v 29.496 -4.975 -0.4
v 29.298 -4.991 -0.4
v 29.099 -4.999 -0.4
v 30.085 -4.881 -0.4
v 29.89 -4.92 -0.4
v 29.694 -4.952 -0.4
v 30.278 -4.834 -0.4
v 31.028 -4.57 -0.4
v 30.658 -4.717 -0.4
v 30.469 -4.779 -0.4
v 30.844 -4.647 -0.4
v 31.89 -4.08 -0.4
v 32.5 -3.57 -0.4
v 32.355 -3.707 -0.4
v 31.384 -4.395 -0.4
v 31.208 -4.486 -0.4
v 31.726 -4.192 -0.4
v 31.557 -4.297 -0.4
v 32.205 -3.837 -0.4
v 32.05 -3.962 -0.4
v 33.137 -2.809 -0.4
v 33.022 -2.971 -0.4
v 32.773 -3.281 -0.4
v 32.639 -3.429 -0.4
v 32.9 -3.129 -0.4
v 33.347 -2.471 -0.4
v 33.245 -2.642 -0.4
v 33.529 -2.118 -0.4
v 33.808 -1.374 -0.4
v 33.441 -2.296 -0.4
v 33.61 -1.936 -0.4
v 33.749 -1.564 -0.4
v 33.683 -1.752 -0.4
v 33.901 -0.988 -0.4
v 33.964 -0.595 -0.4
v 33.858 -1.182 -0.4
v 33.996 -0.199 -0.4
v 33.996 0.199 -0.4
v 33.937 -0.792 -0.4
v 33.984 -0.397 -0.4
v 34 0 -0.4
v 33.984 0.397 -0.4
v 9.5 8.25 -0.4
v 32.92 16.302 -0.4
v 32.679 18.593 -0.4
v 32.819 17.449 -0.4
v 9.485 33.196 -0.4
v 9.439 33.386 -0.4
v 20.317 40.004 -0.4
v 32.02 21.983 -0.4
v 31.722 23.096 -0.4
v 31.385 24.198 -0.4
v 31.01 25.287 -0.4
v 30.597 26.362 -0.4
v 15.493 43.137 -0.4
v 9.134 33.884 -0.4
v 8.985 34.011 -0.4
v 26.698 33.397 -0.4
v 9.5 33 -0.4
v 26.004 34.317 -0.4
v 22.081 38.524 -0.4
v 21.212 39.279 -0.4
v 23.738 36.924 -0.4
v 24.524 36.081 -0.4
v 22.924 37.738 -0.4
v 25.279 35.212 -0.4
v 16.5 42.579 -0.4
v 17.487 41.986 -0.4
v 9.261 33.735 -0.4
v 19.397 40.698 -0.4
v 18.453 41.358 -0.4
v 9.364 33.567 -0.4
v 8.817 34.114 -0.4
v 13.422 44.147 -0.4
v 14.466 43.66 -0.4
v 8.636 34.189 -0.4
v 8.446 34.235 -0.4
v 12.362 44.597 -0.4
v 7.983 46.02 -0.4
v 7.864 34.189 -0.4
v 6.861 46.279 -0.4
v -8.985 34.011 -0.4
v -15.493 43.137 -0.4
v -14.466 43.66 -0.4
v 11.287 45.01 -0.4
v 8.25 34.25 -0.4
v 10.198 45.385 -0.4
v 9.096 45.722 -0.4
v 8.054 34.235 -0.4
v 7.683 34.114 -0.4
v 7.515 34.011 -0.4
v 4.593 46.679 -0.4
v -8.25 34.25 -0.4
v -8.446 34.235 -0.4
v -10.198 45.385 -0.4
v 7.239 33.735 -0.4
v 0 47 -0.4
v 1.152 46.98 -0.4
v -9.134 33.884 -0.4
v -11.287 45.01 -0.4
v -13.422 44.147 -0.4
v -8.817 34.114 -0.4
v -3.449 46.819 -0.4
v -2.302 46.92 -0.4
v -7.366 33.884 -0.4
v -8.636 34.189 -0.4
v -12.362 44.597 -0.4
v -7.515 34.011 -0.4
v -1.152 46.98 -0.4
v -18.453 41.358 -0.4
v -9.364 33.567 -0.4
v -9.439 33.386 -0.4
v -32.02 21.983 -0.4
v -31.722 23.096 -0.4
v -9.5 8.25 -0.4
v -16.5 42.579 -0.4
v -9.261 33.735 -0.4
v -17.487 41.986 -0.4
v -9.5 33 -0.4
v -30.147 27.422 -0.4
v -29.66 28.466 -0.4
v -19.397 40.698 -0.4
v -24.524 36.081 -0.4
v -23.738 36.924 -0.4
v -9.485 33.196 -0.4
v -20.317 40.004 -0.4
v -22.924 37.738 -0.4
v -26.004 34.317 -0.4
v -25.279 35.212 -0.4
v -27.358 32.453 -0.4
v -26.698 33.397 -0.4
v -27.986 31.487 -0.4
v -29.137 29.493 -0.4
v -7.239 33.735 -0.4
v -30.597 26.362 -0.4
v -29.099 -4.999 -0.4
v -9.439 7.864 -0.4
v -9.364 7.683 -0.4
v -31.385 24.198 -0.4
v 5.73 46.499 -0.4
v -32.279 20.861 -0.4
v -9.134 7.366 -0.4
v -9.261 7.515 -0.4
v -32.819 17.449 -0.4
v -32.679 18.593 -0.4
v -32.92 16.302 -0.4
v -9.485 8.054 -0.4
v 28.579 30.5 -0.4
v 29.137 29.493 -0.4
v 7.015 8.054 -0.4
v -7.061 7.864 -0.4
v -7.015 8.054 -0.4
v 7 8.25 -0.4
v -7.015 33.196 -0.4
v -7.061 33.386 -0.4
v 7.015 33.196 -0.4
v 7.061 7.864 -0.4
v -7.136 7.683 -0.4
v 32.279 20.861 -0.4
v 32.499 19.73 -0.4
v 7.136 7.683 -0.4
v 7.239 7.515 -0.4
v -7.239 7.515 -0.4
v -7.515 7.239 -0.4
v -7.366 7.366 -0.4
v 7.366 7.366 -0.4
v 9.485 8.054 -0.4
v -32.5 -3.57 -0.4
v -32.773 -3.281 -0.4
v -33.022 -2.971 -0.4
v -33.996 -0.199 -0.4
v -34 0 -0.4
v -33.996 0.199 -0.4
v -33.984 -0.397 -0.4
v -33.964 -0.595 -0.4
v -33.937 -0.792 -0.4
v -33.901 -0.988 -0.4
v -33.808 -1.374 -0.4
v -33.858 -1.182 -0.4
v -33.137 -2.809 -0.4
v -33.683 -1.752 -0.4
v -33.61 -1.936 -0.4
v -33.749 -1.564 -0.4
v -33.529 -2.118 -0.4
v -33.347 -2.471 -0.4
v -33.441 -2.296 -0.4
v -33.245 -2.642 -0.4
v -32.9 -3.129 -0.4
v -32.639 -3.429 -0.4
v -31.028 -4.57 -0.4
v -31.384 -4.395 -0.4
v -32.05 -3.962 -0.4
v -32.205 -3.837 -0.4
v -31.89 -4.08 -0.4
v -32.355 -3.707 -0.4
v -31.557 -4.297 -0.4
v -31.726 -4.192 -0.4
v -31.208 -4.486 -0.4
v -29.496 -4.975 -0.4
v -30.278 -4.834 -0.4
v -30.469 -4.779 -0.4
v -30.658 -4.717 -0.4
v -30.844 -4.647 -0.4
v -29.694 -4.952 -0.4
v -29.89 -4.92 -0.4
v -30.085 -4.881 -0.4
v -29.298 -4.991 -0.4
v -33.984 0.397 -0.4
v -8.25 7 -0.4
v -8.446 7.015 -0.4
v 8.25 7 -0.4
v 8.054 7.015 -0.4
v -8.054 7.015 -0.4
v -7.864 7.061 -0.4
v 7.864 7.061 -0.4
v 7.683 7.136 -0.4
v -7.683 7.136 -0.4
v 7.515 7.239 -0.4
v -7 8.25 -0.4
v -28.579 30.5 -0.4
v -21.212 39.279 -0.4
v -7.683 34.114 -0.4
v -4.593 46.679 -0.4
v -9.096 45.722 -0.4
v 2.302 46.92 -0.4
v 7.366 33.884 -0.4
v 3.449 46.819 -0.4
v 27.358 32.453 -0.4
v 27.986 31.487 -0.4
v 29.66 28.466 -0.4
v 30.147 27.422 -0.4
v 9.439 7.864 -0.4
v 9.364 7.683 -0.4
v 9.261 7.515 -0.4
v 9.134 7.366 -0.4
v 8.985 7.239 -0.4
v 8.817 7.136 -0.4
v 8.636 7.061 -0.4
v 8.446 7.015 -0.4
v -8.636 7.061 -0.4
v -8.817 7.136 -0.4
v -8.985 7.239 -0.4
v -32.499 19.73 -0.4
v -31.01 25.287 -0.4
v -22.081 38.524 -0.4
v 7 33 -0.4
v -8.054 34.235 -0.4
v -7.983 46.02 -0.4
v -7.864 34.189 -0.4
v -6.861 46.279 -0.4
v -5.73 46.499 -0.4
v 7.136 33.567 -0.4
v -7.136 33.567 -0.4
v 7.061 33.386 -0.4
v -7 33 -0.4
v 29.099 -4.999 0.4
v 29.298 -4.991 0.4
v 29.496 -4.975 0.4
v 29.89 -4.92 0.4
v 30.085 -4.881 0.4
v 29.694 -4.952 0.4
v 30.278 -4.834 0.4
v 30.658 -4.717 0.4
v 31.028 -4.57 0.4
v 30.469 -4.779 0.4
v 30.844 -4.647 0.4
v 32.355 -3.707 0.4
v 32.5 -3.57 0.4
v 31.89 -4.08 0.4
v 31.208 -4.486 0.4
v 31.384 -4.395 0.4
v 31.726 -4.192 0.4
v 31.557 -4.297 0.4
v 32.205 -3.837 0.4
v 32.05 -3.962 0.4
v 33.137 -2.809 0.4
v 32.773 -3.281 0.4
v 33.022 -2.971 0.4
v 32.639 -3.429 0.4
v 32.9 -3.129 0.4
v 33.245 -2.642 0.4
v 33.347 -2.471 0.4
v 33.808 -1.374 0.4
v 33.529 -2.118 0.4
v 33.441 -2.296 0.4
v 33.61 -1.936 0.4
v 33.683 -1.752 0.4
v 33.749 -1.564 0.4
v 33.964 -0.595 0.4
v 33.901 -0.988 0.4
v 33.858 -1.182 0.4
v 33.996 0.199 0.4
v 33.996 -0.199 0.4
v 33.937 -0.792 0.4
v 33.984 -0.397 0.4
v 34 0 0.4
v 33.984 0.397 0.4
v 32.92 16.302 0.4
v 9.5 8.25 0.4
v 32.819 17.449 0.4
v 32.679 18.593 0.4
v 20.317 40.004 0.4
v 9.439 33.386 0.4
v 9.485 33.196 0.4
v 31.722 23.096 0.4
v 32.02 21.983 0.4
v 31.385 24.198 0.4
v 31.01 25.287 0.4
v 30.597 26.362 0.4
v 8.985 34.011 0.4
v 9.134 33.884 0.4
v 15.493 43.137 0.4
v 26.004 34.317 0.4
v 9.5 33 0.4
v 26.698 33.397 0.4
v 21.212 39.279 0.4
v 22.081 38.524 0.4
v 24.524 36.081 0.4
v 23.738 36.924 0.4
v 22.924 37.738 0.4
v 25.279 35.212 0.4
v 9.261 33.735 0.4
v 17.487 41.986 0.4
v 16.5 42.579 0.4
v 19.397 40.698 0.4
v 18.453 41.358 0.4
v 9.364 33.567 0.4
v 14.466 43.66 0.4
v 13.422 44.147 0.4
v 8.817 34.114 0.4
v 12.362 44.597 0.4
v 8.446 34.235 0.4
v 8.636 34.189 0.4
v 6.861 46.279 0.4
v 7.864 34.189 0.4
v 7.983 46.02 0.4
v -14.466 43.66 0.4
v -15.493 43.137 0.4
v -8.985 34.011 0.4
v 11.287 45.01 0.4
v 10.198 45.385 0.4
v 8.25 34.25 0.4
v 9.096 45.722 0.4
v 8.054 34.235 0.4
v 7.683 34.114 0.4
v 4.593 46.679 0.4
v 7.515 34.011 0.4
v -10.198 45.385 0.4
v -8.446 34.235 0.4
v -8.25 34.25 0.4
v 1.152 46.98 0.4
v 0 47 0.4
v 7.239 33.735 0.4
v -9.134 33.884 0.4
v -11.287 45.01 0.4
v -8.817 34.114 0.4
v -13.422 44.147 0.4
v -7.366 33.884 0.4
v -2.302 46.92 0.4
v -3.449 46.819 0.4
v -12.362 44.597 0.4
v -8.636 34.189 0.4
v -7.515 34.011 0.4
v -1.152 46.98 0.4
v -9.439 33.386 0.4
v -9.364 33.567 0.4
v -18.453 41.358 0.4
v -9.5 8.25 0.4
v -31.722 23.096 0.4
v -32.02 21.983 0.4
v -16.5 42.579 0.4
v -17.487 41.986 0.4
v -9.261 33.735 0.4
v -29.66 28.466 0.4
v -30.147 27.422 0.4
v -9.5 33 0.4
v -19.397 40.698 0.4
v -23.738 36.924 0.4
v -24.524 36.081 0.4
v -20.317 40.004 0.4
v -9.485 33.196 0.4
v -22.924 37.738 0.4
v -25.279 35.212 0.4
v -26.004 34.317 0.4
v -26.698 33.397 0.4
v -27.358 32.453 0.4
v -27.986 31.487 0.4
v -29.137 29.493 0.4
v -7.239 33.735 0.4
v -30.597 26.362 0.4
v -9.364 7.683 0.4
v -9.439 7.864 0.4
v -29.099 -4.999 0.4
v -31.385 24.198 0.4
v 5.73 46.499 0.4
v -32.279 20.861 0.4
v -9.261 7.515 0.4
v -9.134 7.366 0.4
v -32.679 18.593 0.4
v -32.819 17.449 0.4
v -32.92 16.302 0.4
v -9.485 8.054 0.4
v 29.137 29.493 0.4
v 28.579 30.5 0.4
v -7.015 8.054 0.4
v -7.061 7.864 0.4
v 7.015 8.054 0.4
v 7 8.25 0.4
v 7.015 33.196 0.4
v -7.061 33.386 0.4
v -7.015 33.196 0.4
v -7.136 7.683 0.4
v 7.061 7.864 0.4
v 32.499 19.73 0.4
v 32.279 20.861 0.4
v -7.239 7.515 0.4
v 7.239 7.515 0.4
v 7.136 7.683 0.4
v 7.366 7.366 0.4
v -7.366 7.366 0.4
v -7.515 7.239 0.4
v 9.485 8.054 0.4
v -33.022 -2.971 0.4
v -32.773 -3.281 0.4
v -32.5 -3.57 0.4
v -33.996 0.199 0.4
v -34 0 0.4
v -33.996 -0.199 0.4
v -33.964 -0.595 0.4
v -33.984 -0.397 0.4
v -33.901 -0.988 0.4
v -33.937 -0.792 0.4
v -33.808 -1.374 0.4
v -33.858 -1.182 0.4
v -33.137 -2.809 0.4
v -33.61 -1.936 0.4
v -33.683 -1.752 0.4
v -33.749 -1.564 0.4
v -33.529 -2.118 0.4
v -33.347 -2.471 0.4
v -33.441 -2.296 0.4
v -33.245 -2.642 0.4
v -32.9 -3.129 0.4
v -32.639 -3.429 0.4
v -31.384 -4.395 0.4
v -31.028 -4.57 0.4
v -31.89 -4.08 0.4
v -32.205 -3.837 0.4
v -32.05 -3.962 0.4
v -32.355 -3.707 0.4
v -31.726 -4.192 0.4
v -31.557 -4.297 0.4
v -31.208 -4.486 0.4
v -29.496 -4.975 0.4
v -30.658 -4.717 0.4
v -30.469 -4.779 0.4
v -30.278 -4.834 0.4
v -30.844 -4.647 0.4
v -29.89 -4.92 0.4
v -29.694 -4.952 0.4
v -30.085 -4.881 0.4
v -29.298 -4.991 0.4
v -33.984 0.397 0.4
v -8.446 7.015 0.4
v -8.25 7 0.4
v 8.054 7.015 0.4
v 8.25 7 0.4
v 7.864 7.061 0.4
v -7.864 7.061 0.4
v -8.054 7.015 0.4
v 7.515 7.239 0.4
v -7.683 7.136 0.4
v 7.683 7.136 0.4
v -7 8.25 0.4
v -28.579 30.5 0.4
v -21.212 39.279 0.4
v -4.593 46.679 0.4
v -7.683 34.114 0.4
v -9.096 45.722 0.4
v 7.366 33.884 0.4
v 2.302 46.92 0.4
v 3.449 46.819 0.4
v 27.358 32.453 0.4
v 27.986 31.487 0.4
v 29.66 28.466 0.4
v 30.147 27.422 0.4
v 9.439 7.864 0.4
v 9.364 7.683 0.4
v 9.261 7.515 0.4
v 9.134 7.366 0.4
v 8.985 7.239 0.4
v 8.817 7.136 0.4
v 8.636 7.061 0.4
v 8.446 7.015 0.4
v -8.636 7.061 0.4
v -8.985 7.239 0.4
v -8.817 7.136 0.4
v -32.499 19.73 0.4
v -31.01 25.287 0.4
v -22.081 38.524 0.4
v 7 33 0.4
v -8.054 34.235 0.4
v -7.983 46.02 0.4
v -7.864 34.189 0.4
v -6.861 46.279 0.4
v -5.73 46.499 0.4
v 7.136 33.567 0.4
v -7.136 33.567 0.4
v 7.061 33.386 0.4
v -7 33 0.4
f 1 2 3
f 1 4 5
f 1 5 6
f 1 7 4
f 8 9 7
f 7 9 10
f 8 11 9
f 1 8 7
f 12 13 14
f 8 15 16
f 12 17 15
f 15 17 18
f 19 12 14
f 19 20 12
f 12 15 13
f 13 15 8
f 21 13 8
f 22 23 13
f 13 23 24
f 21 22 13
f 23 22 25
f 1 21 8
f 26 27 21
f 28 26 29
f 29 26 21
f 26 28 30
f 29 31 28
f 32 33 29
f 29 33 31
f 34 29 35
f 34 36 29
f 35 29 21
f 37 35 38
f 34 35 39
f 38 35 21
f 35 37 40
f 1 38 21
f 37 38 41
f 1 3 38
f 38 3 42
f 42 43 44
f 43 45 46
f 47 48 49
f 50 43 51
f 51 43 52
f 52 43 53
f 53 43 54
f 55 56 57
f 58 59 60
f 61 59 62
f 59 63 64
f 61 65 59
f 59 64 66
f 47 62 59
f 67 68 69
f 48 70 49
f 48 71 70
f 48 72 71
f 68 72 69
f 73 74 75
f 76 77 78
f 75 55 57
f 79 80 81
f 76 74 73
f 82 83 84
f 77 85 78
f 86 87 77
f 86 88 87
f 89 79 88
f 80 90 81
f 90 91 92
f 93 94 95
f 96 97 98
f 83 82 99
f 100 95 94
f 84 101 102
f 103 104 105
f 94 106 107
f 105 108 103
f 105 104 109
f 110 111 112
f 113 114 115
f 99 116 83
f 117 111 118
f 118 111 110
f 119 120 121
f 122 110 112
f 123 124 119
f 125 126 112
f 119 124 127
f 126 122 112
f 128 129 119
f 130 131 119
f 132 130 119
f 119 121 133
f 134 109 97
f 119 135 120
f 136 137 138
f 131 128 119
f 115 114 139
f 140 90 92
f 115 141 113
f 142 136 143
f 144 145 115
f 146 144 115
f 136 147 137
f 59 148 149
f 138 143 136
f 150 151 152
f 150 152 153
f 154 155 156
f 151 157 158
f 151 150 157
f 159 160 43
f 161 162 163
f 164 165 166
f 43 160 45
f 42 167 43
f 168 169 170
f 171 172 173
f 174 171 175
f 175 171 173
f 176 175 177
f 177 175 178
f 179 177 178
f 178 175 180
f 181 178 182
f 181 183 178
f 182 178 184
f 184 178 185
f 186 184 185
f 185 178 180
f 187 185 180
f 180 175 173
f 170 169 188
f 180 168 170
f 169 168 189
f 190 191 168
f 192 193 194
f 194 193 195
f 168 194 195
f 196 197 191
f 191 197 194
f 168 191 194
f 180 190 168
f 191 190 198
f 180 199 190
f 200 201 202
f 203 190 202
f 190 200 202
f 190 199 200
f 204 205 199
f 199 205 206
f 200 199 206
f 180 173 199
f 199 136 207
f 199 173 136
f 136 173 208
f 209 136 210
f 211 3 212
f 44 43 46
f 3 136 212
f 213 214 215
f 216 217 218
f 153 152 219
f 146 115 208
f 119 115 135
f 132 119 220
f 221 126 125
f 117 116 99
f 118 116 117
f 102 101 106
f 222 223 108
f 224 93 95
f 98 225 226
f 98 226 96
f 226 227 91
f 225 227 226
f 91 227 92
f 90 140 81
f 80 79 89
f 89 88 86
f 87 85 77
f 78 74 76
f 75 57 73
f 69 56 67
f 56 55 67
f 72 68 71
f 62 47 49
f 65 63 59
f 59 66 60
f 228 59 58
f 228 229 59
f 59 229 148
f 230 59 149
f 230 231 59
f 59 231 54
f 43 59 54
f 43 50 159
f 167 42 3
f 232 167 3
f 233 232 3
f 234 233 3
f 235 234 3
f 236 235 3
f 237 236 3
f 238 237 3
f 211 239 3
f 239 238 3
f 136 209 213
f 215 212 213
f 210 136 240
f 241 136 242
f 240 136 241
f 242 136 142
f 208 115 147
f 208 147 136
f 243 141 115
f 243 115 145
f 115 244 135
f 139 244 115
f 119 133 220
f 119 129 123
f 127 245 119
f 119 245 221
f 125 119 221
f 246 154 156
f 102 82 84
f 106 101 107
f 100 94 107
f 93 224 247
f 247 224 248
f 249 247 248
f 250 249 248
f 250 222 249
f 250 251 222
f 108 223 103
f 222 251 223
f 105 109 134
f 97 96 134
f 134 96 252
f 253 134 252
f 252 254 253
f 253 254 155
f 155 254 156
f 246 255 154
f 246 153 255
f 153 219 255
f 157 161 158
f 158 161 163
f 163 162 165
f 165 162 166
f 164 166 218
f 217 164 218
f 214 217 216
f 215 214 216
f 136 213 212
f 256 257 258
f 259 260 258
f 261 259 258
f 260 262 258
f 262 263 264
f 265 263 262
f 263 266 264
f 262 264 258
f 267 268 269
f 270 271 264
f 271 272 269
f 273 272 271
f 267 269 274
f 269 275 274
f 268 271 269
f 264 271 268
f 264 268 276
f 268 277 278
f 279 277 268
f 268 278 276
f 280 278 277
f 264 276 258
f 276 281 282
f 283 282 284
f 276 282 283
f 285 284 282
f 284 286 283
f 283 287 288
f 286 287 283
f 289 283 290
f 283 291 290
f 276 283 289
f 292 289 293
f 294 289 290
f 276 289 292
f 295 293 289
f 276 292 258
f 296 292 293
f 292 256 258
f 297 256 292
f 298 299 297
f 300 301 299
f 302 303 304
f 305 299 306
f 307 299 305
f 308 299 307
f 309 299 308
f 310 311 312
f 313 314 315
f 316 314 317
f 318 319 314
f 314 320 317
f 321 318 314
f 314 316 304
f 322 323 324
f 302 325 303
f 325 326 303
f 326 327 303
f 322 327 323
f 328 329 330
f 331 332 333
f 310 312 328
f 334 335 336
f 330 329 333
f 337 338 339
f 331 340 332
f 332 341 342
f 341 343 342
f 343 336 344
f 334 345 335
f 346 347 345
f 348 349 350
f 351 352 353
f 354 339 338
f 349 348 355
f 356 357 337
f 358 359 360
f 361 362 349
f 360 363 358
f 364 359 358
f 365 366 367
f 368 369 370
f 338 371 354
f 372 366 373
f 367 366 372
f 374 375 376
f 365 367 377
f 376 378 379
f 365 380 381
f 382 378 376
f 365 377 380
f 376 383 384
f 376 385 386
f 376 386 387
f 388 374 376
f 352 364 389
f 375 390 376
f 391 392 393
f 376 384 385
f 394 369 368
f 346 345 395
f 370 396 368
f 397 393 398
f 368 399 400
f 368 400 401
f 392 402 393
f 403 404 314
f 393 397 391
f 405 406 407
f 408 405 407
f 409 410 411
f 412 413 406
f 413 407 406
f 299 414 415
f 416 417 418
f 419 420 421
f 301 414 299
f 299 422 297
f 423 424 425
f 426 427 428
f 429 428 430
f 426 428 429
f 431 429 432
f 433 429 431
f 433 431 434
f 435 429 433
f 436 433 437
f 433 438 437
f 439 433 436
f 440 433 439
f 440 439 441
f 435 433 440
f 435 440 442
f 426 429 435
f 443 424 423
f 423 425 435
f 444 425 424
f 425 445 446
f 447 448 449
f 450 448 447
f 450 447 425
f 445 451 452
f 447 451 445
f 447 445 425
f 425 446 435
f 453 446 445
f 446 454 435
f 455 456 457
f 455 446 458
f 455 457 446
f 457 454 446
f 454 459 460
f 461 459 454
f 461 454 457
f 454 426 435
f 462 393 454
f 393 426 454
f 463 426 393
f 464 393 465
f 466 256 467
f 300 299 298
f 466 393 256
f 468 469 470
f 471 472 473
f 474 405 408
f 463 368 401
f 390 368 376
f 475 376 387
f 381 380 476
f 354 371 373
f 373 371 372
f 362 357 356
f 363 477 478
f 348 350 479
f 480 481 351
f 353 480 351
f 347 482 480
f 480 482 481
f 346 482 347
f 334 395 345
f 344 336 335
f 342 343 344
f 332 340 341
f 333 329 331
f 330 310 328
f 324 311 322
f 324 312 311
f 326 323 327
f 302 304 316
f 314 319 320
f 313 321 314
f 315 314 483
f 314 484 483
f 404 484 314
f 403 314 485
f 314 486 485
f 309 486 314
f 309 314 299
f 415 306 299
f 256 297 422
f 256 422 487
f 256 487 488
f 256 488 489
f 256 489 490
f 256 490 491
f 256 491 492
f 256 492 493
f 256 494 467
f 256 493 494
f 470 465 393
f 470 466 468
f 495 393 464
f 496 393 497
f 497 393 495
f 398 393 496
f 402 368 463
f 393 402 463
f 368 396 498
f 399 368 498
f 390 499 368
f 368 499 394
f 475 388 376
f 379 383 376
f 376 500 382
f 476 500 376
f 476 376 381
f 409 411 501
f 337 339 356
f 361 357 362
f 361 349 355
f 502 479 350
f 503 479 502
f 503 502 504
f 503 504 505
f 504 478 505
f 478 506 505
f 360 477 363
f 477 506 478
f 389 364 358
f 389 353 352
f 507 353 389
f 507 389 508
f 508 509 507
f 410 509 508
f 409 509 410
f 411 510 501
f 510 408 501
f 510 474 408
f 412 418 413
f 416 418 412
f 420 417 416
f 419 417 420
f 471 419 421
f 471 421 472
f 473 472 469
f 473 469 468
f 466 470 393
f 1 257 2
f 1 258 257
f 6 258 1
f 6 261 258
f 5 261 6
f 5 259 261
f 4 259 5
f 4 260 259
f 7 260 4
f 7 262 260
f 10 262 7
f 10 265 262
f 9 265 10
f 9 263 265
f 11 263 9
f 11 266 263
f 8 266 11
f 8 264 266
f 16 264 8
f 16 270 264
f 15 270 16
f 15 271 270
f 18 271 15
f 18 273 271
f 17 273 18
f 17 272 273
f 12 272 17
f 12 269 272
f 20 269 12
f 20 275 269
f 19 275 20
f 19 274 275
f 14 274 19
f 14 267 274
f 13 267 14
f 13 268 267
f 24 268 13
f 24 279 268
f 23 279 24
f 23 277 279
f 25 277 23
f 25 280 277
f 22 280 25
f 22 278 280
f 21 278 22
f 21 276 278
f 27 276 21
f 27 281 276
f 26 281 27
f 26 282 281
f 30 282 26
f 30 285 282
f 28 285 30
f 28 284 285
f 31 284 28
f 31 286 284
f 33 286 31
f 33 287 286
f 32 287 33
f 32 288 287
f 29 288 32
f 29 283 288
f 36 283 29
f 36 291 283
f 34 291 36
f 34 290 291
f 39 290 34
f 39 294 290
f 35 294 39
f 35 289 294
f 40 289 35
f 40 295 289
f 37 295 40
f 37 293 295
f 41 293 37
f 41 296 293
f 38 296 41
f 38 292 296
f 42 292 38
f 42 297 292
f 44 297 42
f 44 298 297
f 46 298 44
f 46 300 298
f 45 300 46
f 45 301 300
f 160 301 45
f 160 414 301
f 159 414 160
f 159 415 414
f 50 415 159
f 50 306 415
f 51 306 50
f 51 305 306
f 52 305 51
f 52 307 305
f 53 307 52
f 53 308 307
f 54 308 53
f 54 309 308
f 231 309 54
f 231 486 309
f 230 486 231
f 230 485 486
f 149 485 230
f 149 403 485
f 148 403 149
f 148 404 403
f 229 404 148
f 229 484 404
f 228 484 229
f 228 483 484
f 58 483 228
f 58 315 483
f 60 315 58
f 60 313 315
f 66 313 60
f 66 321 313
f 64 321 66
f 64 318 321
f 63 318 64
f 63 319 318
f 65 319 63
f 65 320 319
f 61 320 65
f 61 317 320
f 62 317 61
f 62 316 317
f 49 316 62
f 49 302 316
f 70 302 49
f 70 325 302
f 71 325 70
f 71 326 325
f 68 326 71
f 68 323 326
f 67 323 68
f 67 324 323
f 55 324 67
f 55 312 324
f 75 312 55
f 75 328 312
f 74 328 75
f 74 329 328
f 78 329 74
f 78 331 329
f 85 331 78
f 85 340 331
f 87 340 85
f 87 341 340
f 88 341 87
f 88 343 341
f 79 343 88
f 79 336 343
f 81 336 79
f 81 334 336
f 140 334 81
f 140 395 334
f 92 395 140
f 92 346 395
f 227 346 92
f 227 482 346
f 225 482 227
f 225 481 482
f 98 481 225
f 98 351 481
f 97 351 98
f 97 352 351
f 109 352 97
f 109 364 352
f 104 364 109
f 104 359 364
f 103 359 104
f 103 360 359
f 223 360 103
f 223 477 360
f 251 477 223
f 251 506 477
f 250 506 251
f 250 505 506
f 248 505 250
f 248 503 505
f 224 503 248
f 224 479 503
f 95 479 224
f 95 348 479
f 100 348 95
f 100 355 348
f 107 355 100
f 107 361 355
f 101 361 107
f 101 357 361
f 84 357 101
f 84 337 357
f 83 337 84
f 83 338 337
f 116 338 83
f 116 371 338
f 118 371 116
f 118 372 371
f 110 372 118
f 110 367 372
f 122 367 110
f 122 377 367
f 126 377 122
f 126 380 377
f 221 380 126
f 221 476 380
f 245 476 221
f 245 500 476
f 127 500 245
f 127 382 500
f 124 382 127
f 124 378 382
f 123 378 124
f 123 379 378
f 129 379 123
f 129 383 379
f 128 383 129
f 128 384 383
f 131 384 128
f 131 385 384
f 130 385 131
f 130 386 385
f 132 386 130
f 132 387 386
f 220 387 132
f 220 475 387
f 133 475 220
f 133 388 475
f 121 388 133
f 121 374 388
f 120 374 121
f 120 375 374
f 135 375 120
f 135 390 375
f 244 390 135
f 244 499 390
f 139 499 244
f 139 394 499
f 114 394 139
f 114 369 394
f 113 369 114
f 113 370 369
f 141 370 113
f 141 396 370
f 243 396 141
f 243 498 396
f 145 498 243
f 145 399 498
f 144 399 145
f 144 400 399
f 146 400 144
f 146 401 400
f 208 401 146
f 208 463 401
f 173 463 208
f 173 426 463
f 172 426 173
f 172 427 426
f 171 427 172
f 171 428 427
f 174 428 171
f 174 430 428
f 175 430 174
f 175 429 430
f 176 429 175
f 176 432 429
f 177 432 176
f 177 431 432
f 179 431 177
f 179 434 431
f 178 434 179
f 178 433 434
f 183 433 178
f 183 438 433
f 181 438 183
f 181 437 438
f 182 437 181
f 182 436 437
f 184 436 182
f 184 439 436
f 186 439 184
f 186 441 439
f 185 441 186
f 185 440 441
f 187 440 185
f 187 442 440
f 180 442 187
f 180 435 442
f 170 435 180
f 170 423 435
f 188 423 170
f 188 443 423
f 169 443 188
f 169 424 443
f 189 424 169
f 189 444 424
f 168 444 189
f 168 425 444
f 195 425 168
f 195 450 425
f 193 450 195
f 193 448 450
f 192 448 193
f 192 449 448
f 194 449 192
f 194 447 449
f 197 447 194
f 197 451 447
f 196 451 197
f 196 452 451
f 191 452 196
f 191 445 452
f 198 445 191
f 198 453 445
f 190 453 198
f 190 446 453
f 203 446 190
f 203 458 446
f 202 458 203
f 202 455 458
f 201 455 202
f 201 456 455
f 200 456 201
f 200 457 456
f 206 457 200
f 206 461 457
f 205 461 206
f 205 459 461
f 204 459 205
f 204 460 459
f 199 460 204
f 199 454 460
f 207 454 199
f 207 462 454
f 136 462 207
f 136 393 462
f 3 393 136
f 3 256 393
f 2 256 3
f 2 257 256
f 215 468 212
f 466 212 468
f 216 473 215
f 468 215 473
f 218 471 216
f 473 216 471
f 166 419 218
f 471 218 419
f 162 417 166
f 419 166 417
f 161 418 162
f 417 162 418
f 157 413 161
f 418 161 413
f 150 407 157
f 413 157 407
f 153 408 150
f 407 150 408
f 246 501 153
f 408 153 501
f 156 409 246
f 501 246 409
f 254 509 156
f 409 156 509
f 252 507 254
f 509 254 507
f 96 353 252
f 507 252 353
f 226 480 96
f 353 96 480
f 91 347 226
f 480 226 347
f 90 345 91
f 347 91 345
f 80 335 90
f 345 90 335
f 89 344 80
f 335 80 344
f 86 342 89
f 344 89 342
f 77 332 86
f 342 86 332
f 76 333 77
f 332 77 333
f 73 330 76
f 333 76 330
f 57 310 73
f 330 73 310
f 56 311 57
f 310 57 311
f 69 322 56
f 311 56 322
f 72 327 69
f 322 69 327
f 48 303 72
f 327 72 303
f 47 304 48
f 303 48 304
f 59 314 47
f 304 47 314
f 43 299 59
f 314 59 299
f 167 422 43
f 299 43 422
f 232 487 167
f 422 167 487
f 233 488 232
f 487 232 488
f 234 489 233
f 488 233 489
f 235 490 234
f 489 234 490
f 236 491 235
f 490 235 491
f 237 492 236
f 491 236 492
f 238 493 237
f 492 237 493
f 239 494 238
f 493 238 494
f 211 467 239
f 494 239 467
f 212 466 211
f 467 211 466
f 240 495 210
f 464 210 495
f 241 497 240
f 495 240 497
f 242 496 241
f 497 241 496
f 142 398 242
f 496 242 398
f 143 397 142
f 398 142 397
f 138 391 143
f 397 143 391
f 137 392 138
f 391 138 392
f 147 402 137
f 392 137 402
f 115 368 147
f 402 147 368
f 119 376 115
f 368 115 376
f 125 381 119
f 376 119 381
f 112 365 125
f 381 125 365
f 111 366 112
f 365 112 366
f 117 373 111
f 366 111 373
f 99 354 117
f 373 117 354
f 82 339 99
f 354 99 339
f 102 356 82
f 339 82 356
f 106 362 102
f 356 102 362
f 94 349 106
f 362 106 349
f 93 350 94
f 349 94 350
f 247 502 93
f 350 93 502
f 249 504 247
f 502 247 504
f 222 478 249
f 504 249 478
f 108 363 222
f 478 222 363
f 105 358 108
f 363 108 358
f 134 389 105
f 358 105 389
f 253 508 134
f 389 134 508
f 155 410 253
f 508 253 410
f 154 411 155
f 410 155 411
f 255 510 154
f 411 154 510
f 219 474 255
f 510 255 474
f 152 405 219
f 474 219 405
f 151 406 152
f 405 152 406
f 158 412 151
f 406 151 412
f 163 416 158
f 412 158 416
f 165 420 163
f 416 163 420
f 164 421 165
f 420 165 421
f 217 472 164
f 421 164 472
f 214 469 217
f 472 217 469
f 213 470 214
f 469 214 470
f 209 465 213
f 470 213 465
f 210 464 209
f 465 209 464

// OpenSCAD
/*
Generate a Hakko FX-888 soldering sponge template to be printed on FDM 3D printer 

GNU General Public License v3.0
Permissions of this strong copyleft license are conditioned on making available complete source
code of licensed works and modifications, which include larger works using a licensed work, under
the same license. Copyright and license notices must be preserved. Contributors provide an express
grant of patent rights.
*/

// Variables default values
scaling_factor = 100; // [1:100]
layer_heigth = 0.2;
number_of_layers = 4;
label = false;
label_font="Liberation Sans:style=Bold";

/* [Hidden] */
width = 68;
length = 52;
filet = 5;
radius = 33;
$fa=2; // default minimum facet angle
$fs=0.2; // default minimum facet size

module fx888_sponge_template( sf = scaling_factor,
                              lh = layer_heigth,
                              nl = number_of_layers,
                              lb = label ) {

  module sponge_surface() {
    hull() {
      for (i = [0:1:1]) {
        mirror([i, 0, 0]) {
          translate([width/2-filet, 0, 0]) {
            circle(r = filet);
          }
        }
      }
      difference() {
        translate([0, length-radius-filet, 0]) {
          circle(r = radius);
        }
        translate([0, -radius/2, 0]) {
          square([width, radius], true);
        }
      }
    }
  }

  module sponge_holes() {
    for (j = [0:1]) {
      mirror([j, 0, 0]) hull() for (i = [1:3:4]) {
        translate([radius/4, radius/i, 0]) circle(d = filet/2);
      }
    }
  }

  module scalling_factor_label() {
    preview_offset = 0.1;
    translate([0, 0, (ceil(nl/2)*lh+preview_offset)/2]) {
      linear_extrude(height = ceil(nl/2)*lh+preview_offset, center = true, convexity = 10, twist = 0) {
        scale([sf/100, sf/100, 0]) rotate([0, 0, 180]) resize([0, filet], auto=true) {
          text(str(sf, "%"), valign = "center", halign = "center", font = label_font);
        }
      }
    }
  }

  // Main
  difference() {
    linear_extrude(height = nl*lh, center = true, convexity = 10, twist = 0) {
     scale([sf/100, sf/100, 0])  difference() {
        sponge_surface();
        sponge_holes();
      }
    }
    if (lb) scalling_factor_label();
  }
}

// Customizer instance
fx888_sponge_template();
